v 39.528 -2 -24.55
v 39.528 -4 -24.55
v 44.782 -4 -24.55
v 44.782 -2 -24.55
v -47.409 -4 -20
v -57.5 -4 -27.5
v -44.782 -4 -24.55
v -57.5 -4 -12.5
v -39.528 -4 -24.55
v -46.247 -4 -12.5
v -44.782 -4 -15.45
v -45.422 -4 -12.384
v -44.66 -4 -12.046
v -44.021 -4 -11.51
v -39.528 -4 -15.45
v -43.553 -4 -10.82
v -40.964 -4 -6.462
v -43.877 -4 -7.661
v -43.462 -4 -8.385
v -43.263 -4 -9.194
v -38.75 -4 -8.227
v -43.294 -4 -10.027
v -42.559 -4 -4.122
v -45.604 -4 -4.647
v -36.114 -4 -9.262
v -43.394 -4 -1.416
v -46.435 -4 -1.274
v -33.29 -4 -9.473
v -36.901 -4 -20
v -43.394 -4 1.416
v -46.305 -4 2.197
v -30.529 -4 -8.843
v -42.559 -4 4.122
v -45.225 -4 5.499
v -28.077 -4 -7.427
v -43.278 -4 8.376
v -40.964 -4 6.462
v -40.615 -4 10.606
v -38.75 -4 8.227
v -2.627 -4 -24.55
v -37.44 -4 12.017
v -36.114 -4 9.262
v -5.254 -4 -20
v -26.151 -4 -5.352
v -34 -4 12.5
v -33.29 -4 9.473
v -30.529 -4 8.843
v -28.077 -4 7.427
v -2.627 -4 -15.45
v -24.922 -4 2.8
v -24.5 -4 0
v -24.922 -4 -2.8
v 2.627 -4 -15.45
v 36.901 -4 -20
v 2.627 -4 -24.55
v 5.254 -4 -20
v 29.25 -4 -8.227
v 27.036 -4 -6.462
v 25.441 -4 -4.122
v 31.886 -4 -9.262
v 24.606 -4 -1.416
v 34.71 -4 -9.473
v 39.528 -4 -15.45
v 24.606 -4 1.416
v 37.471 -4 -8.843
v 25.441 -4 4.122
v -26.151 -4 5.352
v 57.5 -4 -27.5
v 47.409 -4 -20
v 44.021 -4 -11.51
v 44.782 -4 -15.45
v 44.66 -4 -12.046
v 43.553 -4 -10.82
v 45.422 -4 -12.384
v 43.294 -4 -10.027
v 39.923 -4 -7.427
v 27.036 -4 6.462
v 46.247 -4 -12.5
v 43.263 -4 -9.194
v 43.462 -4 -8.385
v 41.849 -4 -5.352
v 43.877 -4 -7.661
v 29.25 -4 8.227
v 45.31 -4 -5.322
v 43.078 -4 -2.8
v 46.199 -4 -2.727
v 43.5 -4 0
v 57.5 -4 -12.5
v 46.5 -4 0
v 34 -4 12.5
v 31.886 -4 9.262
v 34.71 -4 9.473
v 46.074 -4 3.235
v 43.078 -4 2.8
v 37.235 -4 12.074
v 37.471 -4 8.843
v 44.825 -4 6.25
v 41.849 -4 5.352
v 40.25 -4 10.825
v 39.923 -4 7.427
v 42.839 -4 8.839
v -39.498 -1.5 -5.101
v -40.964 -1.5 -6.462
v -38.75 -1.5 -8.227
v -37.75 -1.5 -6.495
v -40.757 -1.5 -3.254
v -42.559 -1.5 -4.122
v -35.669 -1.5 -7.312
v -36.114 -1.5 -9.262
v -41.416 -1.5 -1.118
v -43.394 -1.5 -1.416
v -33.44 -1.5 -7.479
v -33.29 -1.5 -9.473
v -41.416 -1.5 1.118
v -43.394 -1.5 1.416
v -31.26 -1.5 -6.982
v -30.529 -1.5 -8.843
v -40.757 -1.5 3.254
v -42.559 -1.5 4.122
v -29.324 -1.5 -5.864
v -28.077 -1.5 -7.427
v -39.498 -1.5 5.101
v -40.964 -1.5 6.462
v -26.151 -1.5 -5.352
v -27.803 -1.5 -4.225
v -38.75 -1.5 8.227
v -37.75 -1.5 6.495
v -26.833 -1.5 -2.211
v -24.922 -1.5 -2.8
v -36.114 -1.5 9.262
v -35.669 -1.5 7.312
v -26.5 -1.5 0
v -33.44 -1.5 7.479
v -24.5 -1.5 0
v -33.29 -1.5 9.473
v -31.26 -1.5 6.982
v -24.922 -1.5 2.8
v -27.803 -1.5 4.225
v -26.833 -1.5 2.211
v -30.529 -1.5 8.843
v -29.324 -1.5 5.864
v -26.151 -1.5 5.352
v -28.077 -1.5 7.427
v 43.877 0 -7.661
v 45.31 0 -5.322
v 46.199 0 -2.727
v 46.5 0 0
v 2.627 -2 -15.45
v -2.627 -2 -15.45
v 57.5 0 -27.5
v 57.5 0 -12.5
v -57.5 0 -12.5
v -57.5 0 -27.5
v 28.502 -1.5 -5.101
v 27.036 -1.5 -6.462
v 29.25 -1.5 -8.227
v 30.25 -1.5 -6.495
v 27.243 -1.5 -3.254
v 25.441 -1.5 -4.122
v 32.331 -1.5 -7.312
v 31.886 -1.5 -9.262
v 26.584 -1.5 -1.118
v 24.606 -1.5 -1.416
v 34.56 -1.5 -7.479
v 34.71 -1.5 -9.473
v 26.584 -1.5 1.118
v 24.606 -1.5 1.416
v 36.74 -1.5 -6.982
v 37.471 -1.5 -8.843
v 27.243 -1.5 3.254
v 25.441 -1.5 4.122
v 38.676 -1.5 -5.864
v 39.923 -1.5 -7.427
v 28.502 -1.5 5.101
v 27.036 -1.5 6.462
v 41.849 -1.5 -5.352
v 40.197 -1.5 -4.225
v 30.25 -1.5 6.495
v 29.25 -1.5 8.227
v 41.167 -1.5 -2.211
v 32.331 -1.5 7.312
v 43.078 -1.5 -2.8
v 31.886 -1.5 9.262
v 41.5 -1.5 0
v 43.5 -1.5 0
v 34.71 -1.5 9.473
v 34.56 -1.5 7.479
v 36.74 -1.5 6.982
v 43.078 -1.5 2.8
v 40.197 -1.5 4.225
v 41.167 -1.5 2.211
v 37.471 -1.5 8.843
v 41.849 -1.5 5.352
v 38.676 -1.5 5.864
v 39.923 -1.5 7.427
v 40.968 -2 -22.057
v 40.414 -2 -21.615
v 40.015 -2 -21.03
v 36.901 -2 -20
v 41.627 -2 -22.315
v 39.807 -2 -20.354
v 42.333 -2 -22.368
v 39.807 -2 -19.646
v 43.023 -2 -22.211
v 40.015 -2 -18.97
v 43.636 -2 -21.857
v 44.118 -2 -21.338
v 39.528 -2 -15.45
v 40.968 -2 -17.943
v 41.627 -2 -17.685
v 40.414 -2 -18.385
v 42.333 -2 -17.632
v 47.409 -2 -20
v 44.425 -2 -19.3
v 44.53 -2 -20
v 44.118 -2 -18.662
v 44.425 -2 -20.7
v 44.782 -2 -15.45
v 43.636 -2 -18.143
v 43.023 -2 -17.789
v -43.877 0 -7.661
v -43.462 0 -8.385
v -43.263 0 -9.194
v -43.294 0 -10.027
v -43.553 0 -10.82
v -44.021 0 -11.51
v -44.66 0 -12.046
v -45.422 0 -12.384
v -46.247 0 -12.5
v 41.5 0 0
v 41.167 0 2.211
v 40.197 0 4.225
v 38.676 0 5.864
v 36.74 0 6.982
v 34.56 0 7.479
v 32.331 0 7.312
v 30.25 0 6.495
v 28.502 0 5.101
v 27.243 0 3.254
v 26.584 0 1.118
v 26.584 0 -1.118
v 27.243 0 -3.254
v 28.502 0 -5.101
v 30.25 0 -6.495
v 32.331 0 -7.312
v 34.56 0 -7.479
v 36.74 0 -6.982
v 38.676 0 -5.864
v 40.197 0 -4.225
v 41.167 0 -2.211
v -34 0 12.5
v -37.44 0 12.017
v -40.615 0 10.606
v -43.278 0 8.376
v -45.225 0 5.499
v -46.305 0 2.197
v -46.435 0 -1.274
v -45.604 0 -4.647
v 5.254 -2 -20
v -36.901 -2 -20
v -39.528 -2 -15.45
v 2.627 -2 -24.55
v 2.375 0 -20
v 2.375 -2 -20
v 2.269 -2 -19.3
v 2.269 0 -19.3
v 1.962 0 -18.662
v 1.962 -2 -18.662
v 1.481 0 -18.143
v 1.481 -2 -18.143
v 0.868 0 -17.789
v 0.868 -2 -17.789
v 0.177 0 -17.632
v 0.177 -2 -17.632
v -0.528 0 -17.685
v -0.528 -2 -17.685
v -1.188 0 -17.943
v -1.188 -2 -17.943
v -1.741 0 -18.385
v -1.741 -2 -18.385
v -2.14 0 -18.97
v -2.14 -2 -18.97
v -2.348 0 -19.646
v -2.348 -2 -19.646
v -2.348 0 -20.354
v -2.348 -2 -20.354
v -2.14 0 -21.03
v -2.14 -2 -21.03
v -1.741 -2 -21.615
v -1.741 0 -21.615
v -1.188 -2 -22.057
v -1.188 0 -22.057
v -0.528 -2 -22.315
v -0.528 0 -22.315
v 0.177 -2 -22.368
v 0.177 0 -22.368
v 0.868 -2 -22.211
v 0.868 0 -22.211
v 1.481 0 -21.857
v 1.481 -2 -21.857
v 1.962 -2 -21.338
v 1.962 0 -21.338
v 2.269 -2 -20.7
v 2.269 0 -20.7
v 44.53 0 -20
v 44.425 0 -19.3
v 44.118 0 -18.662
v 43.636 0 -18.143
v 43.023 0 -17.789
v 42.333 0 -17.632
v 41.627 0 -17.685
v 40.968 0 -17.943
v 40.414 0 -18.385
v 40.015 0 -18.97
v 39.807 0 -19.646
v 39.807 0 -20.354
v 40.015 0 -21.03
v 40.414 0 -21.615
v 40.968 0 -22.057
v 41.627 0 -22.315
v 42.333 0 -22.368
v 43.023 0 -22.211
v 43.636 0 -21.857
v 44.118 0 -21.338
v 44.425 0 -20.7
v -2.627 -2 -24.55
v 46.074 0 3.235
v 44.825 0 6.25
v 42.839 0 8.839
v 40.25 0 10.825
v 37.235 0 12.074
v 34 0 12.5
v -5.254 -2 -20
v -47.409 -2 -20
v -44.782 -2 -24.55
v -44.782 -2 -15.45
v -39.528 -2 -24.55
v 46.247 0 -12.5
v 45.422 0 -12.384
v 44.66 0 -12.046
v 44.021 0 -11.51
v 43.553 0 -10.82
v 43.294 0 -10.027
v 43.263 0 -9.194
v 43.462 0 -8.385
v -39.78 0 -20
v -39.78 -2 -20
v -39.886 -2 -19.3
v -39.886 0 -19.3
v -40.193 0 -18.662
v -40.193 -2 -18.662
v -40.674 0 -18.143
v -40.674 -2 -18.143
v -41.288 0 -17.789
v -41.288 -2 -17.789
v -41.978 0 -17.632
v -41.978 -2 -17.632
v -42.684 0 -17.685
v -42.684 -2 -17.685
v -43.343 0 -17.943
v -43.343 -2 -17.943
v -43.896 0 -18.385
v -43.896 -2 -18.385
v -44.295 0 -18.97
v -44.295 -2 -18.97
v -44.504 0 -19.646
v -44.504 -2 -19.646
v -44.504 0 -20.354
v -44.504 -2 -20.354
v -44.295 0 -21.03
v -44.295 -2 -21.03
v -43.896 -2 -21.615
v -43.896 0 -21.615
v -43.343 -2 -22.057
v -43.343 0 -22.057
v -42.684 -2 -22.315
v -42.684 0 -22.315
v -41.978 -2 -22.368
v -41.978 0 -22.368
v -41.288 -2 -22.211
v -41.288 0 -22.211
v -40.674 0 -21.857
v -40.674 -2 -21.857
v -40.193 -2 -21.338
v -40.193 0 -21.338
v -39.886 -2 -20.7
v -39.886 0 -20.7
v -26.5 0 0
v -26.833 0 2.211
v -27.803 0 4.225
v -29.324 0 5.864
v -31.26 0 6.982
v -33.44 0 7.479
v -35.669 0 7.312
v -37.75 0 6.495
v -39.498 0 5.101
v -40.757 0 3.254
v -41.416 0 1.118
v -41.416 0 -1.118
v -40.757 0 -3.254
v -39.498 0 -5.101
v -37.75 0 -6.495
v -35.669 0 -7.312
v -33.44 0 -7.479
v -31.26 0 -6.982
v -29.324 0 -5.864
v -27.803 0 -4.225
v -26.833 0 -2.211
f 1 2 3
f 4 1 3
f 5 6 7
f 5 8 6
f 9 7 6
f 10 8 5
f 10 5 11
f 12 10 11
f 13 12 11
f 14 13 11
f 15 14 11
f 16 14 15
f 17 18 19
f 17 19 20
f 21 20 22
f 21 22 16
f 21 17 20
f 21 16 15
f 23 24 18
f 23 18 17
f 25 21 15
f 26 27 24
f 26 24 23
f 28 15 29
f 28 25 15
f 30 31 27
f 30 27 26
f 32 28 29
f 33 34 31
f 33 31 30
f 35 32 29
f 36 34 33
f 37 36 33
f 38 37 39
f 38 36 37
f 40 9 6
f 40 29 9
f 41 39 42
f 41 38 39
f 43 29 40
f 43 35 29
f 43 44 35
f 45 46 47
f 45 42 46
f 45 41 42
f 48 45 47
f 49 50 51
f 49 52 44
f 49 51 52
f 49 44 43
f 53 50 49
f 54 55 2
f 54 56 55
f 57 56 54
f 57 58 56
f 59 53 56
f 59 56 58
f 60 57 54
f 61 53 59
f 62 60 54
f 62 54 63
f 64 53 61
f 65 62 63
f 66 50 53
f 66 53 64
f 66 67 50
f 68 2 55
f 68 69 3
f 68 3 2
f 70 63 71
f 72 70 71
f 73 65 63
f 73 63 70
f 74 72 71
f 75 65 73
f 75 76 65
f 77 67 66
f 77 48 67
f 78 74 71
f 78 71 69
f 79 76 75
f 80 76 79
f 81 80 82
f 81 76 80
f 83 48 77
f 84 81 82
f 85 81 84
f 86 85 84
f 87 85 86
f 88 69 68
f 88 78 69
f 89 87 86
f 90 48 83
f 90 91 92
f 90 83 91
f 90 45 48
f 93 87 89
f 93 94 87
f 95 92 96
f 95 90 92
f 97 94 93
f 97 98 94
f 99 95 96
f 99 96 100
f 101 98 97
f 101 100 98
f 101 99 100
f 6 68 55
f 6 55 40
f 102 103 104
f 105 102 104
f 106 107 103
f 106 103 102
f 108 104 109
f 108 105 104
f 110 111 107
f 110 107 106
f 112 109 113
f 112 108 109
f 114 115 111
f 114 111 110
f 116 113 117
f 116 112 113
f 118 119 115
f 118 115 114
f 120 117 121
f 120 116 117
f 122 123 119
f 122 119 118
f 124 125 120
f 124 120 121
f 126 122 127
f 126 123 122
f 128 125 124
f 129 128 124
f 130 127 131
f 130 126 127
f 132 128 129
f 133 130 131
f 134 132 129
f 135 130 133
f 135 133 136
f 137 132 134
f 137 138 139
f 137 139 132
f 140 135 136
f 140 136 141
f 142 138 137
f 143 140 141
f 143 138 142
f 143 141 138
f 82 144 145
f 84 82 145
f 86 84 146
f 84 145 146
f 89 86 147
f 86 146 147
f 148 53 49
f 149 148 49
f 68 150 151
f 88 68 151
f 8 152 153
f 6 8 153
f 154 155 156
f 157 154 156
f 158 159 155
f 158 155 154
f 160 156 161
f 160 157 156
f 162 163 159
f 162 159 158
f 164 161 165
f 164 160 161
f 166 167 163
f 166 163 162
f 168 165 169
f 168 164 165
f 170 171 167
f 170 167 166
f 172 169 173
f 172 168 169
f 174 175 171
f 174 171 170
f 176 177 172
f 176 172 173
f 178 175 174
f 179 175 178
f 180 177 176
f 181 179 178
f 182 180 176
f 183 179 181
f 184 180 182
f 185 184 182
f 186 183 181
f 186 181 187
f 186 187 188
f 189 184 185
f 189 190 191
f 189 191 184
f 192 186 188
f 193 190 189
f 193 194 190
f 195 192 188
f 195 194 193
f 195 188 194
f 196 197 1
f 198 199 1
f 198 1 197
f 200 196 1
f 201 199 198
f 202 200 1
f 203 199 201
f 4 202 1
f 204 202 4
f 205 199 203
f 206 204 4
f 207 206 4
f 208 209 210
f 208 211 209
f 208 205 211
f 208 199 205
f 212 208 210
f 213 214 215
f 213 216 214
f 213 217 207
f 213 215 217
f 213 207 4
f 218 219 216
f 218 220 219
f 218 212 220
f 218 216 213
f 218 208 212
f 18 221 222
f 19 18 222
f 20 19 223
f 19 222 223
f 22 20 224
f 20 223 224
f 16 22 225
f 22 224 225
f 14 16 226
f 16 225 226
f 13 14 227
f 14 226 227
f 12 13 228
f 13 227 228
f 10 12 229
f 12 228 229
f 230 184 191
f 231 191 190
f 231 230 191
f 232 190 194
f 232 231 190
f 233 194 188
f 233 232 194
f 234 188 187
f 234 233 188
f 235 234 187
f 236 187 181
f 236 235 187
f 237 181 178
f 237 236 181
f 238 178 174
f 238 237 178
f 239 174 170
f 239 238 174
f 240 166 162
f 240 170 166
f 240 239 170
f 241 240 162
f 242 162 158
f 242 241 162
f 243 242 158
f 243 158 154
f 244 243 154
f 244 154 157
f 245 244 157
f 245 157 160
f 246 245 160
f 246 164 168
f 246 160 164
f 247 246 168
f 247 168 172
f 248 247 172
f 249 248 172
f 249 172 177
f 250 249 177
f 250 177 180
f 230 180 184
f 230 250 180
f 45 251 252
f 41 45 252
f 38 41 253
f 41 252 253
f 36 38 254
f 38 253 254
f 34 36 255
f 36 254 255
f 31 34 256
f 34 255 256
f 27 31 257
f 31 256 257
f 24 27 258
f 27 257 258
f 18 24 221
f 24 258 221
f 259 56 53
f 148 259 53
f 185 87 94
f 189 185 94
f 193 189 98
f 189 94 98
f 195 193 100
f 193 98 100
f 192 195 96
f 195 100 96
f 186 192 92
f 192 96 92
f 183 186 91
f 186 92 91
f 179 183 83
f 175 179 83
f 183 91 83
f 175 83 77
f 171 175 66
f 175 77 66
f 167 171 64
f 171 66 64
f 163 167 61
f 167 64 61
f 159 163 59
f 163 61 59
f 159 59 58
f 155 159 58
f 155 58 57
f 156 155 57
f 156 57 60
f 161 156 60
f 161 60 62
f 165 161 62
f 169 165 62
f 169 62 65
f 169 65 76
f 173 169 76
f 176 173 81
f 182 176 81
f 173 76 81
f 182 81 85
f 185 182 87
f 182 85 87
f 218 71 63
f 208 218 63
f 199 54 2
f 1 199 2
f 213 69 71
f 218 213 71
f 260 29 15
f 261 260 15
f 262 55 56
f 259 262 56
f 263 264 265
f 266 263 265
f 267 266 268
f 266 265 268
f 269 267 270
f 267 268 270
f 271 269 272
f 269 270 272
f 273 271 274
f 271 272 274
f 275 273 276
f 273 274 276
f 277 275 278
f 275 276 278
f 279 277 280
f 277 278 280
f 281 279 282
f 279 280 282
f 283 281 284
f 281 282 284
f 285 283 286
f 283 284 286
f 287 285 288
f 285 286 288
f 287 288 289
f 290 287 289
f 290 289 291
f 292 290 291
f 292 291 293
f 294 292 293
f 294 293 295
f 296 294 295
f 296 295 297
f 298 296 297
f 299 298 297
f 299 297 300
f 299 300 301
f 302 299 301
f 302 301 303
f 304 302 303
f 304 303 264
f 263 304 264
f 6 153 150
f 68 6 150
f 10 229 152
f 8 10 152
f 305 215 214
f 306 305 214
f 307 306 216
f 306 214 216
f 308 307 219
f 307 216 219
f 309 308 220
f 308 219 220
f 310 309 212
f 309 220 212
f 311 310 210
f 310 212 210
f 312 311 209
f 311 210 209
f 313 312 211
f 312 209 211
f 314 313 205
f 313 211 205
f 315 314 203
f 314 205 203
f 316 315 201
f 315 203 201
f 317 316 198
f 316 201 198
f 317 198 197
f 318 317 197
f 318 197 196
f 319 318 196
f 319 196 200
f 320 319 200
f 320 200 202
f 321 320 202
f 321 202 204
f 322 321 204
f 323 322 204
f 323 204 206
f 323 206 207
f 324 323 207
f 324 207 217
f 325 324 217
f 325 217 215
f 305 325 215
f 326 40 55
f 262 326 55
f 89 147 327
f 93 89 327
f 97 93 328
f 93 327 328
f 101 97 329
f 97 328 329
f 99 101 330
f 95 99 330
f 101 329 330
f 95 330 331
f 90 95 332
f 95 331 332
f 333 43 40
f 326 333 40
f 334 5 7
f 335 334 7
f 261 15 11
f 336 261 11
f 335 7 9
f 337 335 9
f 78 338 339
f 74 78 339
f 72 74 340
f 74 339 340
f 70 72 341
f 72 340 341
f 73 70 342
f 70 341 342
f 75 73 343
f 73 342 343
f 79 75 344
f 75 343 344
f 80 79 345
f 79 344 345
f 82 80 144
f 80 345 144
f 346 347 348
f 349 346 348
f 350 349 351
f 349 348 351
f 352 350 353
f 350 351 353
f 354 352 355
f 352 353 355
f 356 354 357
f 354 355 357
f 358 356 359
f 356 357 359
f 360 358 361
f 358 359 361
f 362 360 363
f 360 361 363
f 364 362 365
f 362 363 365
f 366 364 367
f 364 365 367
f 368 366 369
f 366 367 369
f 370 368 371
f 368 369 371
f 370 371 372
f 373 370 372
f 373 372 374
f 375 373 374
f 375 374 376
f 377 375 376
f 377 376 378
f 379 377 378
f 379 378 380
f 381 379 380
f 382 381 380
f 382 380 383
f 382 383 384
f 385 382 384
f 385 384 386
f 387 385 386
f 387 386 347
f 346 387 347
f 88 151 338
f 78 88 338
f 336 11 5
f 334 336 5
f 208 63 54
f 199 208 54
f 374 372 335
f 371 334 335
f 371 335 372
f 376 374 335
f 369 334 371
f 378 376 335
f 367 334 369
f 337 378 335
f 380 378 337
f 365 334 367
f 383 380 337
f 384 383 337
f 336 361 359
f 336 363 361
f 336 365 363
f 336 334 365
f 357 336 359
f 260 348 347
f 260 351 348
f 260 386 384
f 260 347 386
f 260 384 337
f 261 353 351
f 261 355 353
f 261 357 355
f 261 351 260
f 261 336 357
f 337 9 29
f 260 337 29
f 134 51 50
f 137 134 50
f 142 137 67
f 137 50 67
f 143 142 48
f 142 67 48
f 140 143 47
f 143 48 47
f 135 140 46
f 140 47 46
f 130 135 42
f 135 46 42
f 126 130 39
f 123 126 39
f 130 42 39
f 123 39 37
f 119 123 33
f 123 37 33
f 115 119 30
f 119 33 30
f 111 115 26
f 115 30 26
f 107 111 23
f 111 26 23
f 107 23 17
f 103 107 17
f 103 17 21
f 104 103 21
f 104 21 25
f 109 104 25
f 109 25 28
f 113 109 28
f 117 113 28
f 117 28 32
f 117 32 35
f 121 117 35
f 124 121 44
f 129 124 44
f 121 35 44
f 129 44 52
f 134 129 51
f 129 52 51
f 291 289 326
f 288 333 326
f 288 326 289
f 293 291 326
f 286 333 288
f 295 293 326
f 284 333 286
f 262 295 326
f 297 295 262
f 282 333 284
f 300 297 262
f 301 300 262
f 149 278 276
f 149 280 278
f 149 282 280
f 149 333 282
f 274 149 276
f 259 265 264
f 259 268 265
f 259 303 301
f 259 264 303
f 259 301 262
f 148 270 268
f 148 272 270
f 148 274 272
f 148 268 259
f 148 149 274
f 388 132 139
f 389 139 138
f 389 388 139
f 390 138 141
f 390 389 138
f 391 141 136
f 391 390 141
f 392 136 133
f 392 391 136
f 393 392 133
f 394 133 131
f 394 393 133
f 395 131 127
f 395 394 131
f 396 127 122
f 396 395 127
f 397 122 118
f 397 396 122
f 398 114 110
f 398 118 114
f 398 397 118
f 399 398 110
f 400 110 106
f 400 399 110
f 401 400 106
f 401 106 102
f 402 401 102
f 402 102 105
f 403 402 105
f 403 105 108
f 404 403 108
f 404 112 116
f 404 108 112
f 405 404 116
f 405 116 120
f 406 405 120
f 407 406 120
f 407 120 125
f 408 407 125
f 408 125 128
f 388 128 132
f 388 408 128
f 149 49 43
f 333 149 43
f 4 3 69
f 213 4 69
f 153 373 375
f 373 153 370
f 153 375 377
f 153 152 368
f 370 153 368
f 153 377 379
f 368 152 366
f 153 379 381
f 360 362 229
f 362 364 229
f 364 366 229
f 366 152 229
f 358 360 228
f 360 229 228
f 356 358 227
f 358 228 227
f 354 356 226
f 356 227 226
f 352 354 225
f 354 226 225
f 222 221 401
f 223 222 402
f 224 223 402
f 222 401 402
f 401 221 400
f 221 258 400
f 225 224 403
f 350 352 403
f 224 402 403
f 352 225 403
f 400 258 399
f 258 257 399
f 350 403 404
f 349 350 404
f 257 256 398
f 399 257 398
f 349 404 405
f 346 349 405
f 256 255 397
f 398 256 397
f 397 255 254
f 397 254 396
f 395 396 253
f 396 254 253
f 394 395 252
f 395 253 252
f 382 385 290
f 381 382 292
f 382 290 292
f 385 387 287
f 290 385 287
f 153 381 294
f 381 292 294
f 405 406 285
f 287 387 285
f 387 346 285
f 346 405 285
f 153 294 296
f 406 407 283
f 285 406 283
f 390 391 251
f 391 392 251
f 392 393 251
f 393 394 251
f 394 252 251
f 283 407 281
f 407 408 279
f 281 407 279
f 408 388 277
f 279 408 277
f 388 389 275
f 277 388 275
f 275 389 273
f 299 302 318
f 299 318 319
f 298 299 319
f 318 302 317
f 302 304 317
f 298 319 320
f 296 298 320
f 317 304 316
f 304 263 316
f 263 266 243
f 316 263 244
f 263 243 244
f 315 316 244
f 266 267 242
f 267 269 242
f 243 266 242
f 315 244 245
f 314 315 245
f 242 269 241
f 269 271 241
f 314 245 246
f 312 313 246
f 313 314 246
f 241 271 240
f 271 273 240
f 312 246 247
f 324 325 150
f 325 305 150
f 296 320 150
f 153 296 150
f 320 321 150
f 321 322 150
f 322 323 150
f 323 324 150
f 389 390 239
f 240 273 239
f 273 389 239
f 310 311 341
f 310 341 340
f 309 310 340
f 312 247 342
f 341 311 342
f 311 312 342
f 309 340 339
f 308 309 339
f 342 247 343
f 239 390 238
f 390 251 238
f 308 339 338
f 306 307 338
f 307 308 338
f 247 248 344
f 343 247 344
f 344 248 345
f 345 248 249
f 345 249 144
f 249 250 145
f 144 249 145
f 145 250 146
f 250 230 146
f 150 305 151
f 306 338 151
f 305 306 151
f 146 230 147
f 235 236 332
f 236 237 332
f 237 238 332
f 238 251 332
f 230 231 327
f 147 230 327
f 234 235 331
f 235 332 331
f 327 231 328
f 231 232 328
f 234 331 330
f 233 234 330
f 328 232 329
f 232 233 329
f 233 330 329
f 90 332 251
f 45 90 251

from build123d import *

# Parameters (mm, degrees)
F0_R     = 7.5
F1_DEPTH = 4
F2_R     = 9.5
F3_DEPTH = 2.5
F4_R     = 2.375
F5_DEPTH = 4.001
F7_DEPTH = 2


with BuildPart() as f1:
    # F0 (on Front) → F1 (new body)
    with BuildSketch(Plane.XZ):
        with BuildLine():
            ThreePointArc((-34, -12.5), (-25.161165, -8.838835), (-21.5, 0))
            ThreePointArc((-21.5, 0), (-25.161165, 8.838835), (-34, 12.5))
            ThreePointArc((-34, 12.5), (-45.225331, 5.499267), (-43.876975, -7.66129))
            ThreePointArc((-43.876975, -7.66129), (-39.499267, -11.225331), (-34, -12.5))
        make_face()
        with Locations((-34, 0)):
            Circle(F0_R, mode=Mode.SUBTRACT)
        with BuildLine():
            ThreePointArc((-34, 12.5), (-25.161165, 8.838835), (-21.5, 0))
            ThreePointArc((-21.5, 0), (-25.161165, -8.838835), (-34, -12.5))
            Line((-34, -12.5), (34, -12.5))
            ThreePointArc((34, -12.5), (21.5, 0), (34, 12.5))
            Line((34, 12.5), (-34, 12.5))
        make_face()
        with BuildLine():
            Line((-46.247449, -12.5), (-34, -12.5))
            ThreePointArc((-34, -12.5), (-39.499267, -11.225331), (-43.876975, -7.66129))
            ThreePointArc((-43.876975, -7.66129), (-43.553369, -10.819824), (-46.247449, -12.5))
        make_face()
        Polygon((34, -12.5), (-34, -12.5), (-46.247449, -12.5), (-57.5, -12.5), (-57.5, -27.5), (57.5, -27.5), (57.5, -12.5), (46.247449, -12.5), align=None)
        with BuildLine():
            ThreePointArc((46.5, 0), (42.838835, 8.838835), (34, 12.5))
            ThreePointArc((34, 12.5), (21.5, 0), (34, -12.5))
            ThreePointArc((34, -12.5), (39.499267, -11.225331), (43.876975, -7.66129))
            ThreePointArc((43.876975, -7.66129), (45.826077, -4.048939), (46.5, 0))
        make_face()
        with Locations((34, 0)):
            Circle(F0_R, mode=Mode.SUBTRACT)
        with BuildLine():
            ThreePointArc((43.876975, -7.66129), (39.499267, -11.225331), (34, -12.5))
            Line((34, -12.5), (46.247449, -12.5))
            ThreePointArc((46.247449, -12.5), (43.553369, -10.819824), (43.876975, -7.66129))
        make_face()
    extrude(amount=F1_DEPTH)

    # F2 (on face) → F3 (cut)
    with BuildSketch(Plane.XZ.offset(4)):
        with Locations((-34, 0)):
            Circle(F2_R)
        with Locations((34, 0)):
            Circle(F2_R)
    extrude(amount=-F3_DEPTH, mode=Mode.SUBTRACT)

    # F4 (on face) → F5 (cut, through all)
    with BuildSketch(Plane.XZ.offset(4)):
        with Locations((0, -20)):
            Circle(F4_R)
        with Locations((42.155199, -20)):
            Circle(F4_R)
        with Locations((-42.155199, -20)):
            Circle(F4_R)
    extrude(amount=-F5_DEPTH, mode=Mode.SUBTRACT)

    # F6 (on face) → F7 (cut)
    with BuildSketch(Plane.XZ.offset(4)):
        Polygon((2.626944, -15.45), (-2.626944, -15.45), (-5.253887, -20), (-2.626944, -24.55), (2.626944, -24.55), (5.253887, -20), align=None)
        Polygon((-39.528255, -15.45), (-44.782142, -15.45), (-47.409086, -20), (-44.782142, -24.55), (-39.528255, -24.55), (-36.901311, -20), align=None)
        Polygon((44.782142, -15.45), (39.528255, -15.45), (36.901311, -20), (39.528255, -24.55), (44.782142, -24.55), (47.409086, -20), align=None)
    extrude(amount=-F7_DEPTH, mode=Mode.SUBTRACT)


solid = f1.part
